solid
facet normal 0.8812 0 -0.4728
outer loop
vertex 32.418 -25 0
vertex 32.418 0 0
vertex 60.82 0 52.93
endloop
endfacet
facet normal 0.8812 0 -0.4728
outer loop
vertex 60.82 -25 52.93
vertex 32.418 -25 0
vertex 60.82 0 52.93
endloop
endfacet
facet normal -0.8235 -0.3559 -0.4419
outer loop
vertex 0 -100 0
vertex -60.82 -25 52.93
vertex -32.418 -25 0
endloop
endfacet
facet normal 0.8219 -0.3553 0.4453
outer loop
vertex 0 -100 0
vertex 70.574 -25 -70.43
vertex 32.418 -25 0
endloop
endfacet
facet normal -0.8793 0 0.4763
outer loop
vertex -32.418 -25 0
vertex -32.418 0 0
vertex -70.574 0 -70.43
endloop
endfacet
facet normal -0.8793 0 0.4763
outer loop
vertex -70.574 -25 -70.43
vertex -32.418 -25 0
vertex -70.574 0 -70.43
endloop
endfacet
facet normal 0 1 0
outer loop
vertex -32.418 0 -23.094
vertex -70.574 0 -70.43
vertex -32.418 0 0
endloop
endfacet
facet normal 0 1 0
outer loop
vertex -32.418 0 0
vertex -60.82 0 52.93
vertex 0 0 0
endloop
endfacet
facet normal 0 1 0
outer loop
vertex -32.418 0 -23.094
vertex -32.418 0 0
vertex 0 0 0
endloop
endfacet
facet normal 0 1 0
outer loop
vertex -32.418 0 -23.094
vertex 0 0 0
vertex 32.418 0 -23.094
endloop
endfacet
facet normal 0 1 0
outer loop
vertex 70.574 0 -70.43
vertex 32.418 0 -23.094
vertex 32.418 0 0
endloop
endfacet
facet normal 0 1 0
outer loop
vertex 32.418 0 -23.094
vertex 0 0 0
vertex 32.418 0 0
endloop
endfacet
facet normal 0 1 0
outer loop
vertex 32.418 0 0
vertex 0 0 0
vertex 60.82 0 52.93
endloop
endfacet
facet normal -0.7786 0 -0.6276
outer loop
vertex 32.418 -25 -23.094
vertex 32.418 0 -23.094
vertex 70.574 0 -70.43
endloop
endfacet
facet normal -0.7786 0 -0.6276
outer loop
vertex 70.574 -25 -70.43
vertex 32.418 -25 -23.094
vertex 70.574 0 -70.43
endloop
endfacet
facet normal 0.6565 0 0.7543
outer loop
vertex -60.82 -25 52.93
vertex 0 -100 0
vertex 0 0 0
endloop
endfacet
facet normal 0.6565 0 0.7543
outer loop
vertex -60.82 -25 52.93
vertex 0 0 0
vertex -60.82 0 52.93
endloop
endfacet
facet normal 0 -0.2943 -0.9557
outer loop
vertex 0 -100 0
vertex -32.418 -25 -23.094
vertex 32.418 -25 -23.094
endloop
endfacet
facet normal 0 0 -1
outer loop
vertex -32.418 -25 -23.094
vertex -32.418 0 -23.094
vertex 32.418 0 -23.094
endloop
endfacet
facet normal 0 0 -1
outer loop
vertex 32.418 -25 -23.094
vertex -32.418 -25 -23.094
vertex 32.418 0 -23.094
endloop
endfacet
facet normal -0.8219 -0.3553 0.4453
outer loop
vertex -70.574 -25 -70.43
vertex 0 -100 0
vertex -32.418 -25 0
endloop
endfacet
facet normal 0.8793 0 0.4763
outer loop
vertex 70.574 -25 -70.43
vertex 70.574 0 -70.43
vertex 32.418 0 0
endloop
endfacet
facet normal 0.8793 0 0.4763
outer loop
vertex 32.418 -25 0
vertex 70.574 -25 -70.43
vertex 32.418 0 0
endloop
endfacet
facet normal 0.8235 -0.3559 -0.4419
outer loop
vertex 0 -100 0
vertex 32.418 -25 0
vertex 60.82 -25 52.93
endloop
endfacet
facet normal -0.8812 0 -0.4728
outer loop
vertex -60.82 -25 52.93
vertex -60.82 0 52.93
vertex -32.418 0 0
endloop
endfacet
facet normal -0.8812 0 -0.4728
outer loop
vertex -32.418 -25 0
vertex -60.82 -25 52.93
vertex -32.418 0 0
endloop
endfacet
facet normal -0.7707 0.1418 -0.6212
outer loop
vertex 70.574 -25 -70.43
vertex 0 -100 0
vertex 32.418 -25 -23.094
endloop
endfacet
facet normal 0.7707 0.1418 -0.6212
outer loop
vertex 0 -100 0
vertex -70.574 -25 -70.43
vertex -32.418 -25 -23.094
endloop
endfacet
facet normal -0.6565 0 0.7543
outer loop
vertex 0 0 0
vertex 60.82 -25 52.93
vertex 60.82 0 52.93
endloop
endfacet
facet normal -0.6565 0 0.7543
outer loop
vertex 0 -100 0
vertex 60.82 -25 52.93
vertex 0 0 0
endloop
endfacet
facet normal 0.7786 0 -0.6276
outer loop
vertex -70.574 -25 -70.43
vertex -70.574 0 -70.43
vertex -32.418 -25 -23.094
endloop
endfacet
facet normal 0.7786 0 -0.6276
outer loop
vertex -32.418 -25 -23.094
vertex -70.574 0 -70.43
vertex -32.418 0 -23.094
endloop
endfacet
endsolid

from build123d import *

# Parameters (mm, degrees)
F1_DEPTH = 25


with BuildPart() as f1:
    # F0 (on Front) → F1 (new body)
    with BuildSketch(Plane.XZ):
        Polygon((60.819678, 52.930329), (0, 0), (-60.819678, 52.930329), (-32.418031, 0), (-70.57377, -70.430331), (-32.418031, -23.094265), (32.418031, -23.094265), (70.57377, -70.430331), (32.418031, 0), align=None)
    extrude(amount=F1_DEPTH)

    # F1_face (on face) → F4 section 0
    with BuildSketch(Plane(origin=(0, -25, -3.53806), x_dir=(1, 0, 0), z_dir=(0, -1, 0)), mode=Mode.PRIVATE) as f4_s0:
        Polygon((-60.819678, 56.468389), (-32.418031, 3.53806), (-70.57377, -66.892271), (-32.418031, -19.556205), (32.418031, -19.556205), (70.57377, -66.892271), (32.418031, 3.53806), (60.819678, 56.468389), (0, 3.53806), align=None)
    loft([f4_s0.sketch, Vertex(0, -100, 0)])


solid = f1.part
